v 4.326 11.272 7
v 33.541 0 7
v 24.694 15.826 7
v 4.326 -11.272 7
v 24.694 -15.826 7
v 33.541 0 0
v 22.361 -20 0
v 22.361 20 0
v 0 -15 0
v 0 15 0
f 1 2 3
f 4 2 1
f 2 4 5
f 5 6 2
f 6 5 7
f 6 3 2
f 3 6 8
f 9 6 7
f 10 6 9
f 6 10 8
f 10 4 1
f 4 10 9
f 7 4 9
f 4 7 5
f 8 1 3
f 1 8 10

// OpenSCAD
/*  Pyritohedron https://en.wikipedia.org/wiki/Dodecahedron#Pyritohedron
    Preliminary exploration before working on magnetic tile code
    Vary h from -1 to 1.
    At h=0, a cube
    At h=1, a rhombic dodecahedron
    At -1<h<0 it pulls inwards and vanishes at h=-1
    h=0.5*(sqrt(5)-1); //Inverse golden ratio; regular dodecahedron
*/

/*  length in mm
    distance of the fixed points from origin
    (see animation on wikipedia; size of side of starting cube)
    For the cube, this is half the length of a side
    For the rhombus, this is half the shorter diagonal
    For the pentagonal cases, this is the distance between a specific pair of vertices
*/
tilesize = 20;
thickness =7;

h=0.5; //single parameter to define this shape

function dot(v = [1,0,0], w = [0,1,0]) = v[0]*w[0]+v[1]*w[1]+v[2]*w[2]; //dot product of two vectors
function angle(v = [1,1,1], w = [1,1,1]) = acos(dot(v,w)/(norm(v)*norm(w)));  //angle between two vectors

function deg2rad(degs = 0) = degs*PI/180;
function rad2deg(rads = 0) = rads*180/PI;

module pyritohedron(h=0.5*(sqrt(5)-1)){
    polyhedron(
        points =
            [
            [1,1,-1],
            [(1+h),(1-pow(h,2)),0],
            [1,1,1],
            [(1-pow(h,2)),0,(1+h)],
            [1,-1,1],
            [(1+h),-(1-pow(h,2)),0],
            [1,-1,-1],
            [(1-pow(h,2)),0,-(1+h)],  
            [0,-(1+h),-(1-pow(h,2))],
            [-1,-1,-1],
            [-(1+h),-(1-pow(h,2)),0],
            [-1,-1,1],
            [0,-(1+h),(1-pow(h,2))],
            [-(1-pow(h,2)),0,-(1+h)],
            [-1,1,-1],
            [-(1+h),(1-pow(h,2)),0],
            [-1,1,1],
            [-(1-pow(h,2)),0,(1+h)],
            [0,(1+h),-(1-pow(h,2))],
            [0,(1+h),(1-pow(h,2))]
            ], 
            
        faces = 
            [
            [5,4,3,2,1],
            [5,1,0,7,6],
            [12,4,5,6,8],
            [12,8,9,10,11],
            [11,10,15,16,17],
            [10,9,13,14,15],
            [16,15,14,18,19],
            [19,18,0,1,2],
            [3,4,12,11,17],
            [19,2,3,17,16],
            [7,0,18,14,13],
            [13,9,8,6,7],
            ]
    ); 
}

theta = -angle(v=[1,0,0],w=[-pow(h,2)-h,0,(1+h)]); // dihedral angle #1, 'base-to-base'
ry = [[cos(theta),0,sin(theta)],[0,1,0],[-sin(theta),0,cos(theta)]]; //y axis rotation
f1v1 = [(1+h),0,0] - [(1+h),(1-pow(h,2)),0]; //vector1 used to define face1
f1v2 = [(1+h),0,0] - [(1-pow(h,2)),0,(1+h)]; //vector 2 used to define face1
f2v1 = [0,-(1+h),0] - [(1+h),-(1-pow(h,2)),0]; //vector 1 used to define face2
f2v2 = [0,-(1+h),0] - [0,-(1+h),-(1-pow(h,2))]; //vector 2 used to define face2
norm1 = cross(f1v1,f1v2); //normal vector to face1
norm2 = cross(f2v1,f2v2); //normal vector to face2
phi = angle(v=norm2,w=norm1); //dihedral angle #2, 'sideA-to-sideB'

//pyritohedron(h); //pyritohedron solid model

facepoints3d = [
                [0,(1-pow(h,2)),0]*ry,
                [-h,1,1]*ry,
                [(-pow(h,2)-h),0,(1+h)]*ry,
                [-h,-1,1]*ry,
                [0,-(1-pow(h,2)),0]*ry
             ];

facepoints = [
                [facepoints3d[0][0],facepoints3d[0][1]],
                [facepoints3d[1][0],facepoints3d[1][1]],
                [facepoints3d[2][0],facepoints3d[2][1]],
                [facepoints3d[3][0],facepoints3d[3][1]],
                [facepoints3d[4][0],facepoints3d[4][1]],
             ];

difference(){
    linear_extrude(height=thickness,center=false){
        scale([tilesize,tilesize,tilesize]){
            polygon(points = facepoints);
        }
    }
    interior1 = angle(v=(facepoints3d[3]-facepoints3d[4]),w=facepoints3d[4]);
    rotate([0,90-abs(theta)/2,0]) translate([-tilesize,-tilesize,0]) cube([tilesize,2*tilesize,2*tilesize]);
    translate(facepoints[4]*tilesize) rotate([0,0,interior1]) rotate([0,90-phi/2,0]) translate([-tilesize,-1.5*tilesize,0]) cube([tilesize,2*tilesize,2*tilesize]);
    mirror([0,1,0]) translate(facepoints[4]*tilesize) rotate([0,0,interior1]) rotate([0,90-phi/2,0]) translate([-tilesize,-1.5*tilesize,0]) cube([tilesize,2*tilesize,2*tilesize]);
}
